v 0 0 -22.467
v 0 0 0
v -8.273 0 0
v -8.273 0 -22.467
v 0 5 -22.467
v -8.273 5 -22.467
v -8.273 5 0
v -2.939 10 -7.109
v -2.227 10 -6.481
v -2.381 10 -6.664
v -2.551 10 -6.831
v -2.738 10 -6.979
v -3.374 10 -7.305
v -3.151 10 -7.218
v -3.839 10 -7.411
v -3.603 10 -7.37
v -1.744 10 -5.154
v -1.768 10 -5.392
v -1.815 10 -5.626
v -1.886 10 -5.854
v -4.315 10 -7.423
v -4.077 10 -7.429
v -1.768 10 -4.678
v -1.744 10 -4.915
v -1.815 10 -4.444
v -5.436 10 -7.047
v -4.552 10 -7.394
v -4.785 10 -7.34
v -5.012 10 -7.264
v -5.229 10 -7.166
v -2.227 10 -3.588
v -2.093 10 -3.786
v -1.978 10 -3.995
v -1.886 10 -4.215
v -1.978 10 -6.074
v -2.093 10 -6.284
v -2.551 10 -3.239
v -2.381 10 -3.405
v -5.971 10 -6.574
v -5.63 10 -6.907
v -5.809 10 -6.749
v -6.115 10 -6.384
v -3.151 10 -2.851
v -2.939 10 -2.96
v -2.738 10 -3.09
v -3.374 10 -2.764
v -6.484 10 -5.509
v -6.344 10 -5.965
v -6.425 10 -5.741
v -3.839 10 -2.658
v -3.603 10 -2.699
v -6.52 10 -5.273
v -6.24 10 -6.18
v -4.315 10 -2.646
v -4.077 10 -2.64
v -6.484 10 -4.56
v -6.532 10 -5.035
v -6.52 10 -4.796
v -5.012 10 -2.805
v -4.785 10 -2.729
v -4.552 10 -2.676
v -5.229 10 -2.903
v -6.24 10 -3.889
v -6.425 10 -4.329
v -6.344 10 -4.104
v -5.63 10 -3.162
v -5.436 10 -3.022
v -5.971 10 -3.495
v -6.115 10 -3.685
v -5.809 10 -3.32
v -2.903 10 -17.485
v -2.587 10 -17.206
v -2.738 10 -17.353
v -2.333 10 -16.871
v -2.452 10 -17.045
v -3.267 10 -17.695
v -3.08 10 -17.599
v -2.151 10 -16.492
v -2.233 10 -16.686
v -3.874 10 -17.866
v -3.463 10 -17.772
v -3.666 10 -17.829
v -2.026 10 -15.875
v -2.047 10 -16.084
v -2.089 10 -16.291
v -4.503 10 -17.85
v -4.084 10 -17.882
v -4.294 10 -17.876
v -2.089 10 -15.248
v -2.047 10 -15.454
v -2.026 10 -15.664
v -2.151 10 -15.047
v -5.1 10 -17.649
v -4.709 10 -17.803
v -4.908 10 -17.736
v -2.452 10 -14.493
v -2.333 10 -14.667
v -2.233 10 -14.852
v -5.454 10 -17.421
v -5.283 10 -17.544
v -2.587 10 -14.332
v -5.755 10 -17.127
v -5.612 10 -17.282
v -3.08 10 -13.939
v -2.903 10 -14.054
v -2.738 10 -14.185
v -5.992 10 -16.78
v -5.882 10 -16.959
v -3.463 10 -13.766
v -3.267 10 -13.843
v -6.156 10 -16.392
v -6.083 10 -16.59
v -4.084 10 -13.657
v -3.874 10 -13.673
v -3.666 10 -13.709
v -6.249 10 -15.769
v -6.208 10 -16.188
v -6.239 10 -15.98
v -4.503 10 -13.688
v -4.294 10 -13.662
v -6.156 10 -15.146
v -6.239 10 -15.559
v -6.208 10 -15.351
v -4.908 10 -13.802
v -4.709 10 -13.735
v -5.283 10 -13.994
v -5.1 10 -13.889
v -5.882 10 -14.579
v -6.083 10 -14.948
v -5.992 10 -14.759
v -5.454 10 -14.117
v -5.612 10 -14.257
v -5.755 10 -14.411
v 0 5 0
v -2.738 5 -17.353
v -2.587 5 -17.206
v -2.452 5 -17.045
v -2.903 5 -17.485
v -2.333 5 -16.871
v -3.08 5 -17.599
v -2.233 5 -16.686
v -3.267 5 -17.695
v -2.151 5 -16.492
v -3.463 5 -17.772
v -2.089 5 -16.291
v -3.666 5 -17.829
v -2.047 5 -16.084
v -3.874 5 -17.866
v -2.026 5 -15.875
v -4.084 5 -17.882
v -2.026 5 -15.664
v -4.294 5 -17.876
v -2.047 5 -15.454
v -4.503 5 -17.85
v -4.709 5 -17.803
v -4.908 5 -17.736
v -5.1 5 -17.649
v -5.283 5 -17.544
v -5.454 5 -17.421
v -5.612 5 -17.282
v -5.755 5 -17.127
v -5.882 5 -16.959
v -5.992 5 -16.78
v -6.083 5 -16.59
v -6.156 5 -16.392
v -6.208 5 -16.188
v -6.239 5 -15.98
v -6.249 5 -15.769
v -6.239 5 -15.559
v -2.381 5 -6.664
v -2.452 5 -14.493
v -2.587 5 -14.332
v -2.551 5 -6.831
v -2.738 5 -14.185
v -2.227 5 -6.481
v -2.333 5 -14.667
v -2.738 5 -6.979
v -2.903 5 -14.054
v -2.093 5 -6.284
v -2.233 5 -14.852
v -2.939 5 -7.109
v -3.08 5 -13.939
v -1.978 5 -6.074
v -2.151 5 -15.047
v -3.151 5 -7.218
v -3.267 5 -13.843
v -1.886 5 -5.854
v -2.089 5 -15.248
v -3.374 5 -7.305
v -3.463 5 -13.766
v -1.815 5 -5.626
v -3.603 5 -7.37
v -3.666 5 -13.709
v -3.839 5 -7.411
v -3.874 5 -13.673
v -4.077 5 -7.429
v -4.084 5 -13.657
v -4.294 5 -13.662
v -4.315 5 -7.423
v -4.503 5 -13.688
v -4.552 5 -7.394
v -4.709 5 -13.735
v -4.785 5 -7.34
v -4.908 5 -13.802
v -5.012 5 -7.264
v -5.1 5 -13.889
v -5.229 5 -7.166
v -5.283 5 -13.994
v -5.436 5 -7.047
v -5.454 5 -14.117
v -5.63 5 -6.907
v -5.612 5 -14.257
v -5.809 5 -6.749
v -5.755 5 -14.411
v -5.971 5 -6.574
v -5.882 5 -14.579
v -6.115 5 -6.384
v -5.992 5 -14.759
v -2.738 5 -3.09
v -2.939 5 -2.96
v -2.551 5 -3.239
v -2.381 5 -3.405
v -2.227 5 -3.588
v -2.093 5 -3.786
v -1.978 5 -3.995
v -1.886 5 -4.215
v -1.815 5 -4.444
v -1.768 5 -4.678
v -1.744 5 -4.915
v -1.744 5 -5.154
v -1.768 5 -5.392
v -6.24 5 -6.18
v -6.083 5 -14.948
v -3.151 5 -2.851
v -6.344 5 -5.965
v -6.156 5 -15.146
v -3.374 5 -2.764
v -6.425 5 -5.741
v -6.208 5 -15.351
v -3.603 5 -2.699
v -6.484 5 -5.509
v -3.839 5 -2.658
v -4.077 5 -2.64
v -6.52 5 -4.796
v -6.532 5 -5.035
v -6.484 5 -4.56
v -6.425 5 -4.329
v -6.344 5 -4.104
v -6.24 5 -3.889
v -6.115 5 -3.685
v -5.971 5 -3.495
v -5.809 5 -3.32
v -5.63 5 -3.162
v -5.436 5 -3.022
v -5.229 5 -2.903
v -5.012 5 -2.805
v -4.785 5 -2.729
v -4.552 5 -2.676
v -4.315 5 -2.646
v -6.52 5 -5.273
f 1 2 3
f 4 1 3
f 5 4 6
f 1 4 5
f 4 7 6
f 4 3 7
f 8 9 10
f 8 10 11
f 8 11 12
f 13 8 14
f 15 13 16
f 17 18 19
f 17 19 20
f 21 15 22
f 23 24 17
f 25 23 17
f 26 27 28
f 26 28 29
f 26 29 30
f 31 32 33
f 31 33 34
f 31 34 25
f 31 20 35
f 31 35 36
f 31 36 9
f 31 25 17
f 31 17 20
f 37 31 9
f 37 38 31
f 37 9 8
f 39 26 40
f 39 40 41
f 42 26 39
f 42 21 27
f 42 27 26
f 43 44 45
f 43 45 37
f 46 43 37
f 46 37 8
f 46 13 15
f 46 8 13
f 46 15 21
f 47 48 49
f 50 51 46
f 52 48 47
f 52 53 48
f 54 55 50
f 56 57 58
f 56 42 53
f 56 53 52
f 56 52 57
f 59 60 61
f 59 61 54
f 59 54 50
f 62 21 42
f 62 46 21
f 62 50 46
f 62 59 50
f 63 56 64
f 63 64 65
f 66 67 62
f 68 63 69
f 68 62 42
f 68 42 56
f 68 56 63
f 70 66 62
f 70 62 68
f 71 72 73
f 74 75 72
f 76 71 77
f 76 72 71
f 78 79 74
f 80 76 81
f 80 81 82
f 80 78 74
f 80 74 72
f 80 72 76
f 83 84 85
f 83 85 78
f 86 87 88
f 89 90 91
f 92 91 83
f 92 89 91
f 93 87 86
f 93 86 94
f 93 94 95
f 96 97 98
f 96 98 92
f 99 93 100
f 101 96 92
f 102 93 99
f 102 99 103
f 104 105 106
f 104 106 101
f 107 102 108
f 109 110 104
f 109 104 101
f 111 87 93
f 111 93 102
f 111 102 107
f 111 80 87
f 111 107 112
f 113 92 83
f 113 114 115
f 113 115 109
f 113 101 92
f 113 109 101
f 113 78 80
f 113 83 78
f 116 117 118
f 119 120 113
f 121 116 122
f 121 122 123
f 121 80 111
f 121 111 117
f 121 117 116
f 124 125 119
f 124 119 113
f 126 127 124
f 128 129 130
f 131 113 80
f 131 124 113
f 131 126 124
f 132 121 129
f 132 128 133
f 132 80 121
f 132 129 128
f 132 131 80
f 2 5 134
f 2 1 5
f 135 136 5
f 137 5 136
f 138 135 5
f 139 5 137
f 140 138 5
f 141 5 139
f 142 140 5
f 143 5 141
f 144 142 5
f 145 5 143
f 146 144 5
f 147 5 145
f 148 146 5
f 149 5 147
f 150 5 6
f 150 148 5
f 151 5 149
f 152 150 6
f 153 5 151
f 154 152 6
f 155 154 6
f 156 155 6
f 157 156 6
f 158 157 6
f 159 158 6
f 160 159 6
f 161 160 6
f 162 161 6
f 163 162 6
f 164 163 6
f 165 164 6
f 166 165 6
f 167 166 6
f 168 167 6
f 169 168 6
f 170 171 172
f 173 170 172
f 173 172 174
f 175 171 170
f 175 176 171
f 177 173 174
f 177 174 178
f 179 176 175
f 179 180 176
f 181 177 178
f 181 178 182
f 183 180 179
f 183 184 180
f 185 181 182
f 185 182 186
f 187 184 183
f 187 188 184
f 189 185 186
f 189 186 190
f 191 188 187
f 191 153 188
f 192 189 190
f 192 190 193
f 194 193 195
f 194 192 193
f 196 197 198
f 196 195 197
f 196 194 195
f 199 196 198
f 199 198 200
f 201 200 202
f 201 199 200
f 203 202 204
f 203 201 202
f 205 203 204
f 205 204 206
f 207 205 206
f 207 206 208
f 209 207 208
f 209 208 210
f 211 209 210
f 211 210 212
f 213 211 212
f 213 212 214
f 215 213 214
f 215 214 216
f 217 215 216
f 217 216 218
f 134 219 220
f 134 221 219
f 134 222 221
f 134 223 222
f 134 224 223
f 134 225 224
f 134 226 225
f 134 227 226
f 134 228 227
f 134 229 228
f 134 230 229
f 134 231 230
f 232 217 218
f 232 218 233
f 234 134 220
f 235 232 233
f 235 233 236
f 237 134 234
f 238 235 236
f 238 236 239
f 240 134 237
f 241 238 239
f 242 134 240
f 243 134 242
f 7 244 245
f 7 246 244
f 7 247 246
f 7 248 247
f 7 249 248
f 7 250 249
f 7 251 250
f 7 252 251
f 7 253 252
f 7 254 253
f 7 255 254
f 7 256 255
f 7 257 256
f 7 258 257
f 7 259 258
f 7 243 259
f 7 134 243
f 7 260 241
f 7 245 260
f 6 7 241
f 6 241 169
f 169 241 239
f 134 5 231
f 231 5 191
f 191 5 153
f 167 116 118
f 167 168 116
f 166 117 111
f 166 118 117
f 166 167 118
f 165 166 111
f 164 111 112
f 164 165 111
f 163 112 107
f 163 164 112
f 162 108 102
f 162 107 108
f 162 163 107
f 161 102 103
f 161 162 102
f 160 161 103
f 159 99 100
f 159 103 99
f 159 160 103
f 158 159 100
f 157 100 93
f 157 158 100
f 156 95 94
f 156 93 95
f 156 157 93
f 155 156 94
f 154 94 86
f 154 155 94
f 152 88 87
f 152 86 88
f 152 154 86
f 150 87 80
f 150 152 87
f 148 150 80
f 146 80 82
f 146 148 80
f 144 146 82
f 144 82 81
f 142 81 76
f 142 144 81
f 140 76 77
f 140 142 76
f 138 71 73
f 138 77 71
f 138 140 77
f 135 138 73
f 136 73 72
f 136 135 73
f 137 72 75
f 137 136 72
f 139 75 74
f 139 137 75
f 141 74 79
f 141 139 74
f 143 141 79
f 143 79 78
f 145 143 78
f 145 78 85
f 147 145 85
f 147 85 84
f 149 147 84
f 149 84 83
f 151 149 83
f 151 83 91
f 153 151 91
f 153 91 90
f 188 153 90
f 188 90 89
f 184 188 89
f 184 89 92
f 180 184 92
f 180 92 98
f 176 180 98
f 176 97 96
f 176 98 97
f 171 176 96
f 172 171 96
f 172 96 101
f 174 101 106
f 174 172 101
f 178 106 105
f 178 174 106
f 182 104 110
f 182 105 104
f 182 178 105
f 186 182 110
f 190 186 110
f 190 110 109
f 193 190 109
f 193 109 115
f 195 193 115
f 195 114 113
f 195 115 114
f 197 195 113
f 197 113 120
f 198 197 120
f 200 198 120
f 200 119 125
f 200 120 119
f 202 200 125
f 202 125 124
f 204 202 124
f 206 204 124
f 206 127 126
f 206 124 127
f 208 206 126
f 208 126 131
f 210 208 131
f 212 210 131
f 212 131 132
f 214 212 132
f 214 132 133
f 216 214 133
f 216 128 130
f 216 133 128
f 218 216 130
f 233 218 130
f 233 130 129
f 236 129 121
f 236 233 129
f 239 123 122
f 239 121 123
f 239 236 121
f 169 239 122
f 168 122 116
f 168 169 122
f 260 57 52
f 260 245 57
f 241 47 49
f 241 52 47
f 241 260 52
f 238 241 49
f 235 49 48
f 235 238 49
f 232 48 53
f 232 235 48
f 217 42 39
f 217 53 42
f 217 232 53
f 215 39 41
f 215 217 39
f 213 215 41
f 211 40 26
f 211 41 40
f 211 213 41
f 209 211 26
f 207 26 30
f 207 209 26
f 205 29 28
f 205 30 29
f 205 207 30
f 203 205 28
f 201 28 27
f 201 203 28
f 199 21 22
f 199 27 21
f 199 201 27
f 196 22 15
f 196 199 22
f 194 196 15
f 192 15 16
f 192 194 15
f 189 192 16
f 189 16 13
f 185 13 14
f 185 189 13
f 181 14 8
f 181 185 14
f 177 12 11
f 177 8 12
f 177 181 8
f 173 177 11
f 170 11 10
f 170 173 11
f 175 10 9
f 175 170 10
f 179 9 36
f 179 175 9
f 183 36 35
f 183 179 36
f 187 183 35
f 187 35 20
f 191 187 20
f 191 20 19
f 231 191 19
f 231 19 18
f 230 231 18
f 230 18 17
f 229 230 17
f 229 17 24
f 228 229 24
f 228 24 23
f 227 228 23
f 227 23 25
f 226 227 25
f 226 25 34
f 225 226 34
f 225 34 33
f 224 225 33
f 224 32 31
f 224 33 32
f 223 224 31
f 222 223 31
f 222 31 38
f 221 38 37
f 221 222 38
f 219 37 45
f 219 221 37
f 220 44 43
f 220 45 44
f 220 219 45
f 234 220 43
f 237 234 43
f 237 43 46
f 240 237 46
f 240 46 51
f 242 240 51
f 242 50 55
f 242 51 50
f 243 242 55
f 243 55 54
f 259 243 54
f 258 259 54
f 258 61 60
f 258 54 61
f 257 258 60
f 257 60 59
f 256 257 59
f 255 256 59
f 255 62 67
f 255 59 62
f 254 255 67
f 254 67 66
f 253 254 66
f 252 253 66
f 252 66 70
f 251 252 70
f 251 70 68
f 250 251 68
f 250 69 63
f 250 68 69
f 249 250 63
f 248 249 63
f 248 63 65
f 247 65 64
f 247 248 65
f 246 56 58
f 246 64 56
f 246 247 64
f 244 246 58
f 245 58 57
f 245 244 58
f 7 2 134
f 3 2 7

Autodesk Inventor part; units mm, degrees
ref_plane "YZ Plane" through (0, 0, 0) normal (1, 0, 0) x (0, 1, 0)
ref_plane "XZ Plane" through (0, 0, 0) normal (0, 1, 0) x (-1, 0, 0)
ref_plane "XY Plane" through (0, 0, 0) normal (0, 0, 1) x (1, 0, 0)
sketch "Sketch1" plane through (0, 0, 0) normal (0, 1, 0) x (-1, 0, 0)
  line L0 (0, 0) -> (8.2727, 0)
  line L1 (8.2727, 0) -> (8.2727, -22.4672)
  line L2 (8.2727, -22.4672) -> (0, -22.4672)
  line L3 (0, -22.4672) -> (0, 0)
  circle A0 centre (4.1364, -5.0346) radius 2.3953
  circle A1 centre (4.1364, -15.7692) radius 2.113
extrude "Extrusion1" add sketch "Sketch1" along normal blind 5
extrude "Extrusion2" add sketch "Sketch1" along normal blind 10 contours A0 | A1
properties part number ","
